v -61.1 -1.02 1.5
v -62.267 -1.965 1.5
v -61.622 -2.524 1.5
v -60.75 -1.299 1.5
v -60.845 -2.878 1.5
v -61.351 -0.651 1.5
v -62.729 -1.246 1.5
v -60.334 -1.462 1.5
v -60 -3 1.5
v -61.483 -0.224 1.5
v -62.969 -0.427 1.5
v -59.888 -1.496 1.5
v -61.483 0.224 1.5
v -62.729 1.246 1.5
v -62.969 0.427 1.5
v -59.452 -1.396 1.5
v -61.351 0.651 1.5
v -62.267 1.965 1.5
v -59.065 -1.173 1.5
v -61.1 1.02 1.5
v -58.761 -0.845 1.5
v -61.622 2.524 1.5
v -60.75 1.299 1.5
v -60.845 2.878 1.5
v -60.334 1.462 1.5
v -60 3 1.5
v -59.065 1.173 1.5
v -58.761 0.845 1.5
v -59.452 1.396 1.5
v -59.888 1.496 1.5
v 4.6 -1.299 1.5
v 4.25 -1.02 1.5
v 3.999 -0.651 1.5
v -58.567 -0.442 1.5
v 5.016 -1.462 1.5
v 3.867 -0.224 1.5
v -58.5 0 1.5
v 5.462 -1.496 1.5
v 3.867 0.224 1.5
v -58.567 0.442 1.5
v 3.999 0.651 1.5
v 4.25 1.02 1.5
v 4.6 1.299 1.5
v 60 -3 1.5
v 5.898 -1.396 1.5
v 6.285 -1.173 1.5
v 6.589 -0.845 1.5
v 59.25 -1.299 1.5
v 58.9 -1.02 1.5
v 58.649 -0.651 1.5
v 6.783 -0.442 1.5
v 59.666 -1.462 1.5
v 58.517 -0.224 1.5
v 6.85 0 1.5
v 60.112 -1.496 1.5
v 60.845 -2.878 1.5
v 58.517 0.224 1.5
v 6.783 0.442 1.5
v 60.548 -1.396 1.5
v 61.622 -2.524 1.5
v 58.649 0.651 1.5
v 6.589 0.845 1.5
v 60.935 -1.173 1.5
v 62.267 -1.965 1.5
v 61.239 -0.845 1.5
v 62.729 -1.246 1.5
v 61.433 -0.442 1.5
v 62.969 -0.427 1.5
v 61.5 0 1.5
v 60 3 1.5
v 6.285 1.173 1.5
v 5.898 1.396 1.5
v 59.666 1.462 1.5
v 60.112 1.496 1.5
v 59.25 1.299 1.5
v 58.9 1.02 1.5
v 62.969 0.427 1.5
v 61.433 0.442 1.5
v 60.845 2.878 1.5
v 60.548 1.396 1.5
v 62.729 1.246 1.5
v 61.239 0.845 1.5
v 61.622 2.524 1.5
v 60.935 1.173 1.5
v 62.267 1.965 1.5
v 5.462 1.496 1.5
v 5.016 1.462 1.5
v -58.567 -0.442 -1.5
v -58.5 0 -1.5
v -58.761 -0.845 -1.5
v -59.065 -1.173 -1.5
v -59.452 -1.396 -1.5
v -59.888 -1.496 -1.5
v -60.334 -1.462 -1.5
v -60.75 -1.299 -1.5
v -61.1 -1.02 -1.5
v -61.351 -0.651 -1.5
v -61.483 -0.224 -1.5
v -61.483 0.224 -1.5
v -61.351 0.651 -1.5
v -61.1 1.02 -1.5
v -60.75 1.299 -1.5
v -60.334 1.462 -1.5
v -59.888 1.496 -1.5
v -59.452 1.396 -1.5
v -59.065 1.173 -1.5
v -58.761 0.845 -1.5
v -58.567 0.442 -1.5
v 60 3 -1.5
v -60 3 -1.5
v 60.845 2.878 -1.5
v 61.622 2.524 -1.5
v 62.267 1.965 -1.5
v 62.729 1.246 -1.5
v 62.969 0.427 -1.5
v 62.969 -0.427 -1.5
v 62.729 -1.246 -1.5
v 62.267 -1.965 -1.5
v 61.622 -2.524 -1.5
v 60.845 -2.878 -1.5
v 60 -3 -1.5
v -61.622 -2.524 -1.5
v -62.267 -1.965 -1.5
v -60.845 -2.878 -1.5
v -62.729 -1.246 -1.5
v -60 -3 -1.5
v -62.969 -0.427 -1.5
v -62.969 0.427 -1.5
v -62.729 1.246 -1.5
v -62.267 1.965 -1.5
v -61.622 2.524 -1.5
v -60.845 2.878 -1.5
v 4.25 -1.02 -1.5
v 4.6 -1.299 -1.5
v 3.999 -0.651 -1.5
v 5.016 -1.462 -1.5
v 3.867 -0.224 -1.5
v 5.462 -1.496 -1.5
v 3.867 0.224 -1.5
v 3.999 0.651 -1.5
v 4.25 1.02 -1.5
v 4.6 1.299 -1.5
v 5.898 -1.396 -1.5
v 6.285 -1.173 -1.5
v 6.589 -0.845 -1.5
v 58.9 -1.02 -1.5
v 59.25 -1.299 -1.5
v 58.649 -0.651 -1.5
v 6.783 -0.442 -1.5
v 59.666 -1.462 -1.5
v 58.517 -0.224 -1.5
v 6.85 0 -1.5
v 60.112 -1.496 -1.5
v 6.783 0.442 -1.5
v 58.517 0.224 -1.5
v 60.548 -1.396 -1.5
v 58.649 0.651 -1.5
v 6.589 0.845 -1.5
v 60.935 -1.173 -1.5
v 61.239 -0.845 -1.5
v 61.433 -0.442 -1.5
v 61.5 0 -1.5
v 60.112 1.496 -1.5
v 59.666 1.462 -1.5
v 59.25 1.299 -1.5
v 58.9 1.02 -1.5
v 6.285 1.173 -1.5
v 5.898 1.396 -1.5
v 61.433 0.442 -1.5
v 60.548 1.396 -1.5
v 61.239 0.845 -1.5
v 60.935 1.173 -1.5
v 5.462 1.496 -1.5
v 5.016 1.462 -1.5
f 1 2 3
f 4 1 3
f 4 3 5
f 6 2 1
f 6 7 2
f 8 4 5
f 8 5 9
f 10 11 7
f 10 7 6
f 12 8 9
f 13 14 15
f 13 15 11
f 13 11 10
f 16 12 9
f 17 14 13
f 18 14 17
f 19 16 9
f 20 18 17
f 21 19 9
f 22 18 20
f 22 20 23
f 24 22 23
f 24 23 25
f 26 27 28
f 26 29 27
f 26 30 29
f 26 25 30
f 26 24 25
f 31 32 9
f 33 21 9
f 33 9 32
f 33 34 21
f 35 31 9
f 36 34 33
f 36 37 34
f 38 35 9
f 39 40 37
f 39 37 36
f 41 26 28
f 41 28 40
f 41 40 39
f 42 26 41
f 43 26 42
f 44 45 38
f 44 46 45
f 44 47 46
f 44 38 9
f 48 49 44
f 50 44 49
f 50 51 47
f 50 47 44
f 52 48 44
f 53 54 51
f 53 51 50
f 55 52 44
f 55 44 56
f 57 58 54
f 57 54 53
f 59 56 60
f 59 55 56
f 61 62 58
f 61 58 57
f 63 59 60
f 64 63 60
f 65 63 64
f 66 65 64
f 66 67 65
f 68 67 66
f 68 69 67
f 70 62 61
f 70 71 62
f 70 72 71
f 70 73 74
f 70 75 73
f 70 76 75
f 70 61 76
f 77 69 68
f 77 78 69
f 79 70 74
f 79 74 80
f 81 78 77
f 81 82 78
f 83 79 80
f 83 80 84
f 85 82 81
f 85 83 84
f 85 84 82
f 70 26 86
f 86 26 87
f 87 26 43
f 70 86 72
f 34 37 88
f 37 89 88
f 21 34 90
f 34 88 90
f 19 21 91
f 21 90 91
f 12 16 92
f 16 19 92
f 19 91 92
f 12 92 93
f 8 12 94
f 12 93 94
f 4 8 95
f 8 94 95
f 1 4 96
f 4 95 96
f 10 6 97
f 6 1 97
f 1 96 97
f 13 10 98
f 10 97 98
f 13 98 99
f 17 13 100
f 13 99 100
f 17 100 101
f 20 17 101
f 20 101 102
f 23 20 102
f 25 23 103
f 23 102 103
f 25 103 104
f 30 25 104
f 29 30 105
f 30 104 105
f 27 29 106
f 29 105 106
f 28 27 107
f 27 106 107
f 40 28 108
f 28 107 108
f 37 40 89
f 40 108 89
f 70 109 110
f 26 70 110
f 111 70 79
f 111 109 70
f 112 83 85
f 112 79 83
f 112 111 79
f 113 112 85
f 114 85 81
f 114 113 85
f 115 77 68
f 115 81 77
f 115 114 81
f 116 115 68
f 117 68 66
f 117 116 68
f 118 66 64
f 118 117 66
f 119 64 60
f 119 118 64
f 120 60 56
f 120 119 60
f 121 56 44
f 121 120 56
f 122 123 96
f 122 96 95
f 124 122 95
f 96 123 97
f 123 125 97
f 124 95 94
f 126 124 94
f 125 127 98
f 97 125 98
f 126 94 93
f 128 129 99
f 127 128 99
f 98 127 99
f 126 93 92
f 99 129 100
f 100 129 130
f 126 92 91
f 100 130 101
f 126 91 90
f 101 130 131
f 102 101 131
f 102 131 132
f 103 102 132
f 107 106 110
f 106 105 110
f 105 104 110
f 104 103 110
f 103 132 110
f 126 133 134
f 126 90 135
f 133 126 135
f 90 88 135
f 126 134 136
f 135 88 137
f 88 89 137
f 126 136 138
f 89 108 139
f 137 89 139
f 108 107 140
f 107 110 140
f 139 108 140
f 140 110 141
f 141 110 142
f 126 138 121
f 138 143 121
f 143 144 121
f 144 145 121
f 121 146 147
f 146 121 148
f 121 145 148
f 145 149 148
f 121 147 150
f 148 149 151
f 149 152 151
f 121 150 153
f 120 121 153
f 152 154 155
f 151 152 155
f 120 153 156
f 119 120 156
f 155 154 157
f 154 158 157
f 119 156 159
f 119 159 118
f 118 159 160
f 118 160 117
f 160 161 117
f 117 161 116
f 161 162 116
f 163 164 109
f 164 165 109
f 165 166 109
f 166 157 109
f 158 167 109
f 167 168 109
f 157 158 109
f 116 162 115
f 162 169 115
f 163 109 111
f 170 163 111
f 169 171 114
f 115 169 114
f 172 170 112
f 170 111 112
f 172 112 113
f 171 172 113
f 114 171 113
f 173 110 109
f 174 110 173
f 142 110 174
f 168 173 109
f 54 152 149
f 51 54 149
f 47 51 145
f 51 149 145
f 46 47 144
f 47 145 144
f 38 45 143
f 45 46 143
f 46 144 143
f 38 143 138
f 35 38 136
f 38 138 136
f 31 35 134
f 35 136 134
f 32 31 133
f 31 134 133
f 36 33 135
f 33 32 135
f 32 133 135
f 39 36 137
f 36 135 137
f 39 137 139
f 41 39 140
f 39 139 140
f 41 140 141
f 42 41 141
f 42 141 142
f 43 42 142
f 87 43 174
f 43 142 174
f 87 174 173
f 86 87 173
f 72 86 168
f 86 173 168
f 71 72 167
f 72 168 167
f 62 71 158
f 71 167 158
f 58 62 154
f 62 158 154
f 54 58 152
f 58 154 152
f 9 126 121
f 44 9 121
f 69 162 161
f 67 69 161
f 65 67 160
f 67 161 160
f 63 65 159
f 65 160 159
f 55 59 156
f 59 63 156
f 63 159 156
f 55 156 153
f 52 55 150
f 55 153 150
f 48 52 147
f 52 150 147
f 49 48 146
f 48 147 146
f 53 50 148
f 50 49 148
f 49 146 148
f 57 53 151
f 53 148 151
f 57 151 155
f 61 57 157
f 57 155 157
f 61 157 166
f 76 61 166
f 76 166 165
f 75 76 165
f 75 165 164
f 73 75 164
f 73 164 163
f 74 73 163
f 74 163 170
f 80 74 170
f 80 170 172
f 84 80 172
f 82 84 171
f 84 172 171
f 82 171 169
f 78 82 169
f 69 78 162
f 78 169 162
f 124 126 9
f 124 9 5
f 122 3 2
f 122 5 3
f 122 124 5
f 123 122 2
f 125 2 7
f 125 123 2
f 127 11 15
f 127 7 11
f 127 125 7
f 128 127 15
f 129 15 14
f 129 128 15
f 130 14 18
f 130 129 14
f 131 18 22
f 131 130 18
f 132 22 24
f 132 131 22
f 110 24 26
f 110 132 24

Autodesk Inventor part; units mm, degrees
ref_plane "YZ Plane" through (0, 0, 0) normal (1, 0, 0) x (0, 1, 0)
ref_plane "XZ Plane" through (0, 0, 0) normal (0, 1, 0) x (-1, 0, 0)
ref_plane "XY Plane" through (0, 0, 0) normal (0, 0, 1) x (1, 0, 0)
sketch "Esquisse1" plane through (0, 0, 0) normal (0, 0, 1) x (1, 0, 0)
  line L0 (-63, 0) -> (63, 0) construction
  line L1 (-60, -3) -> (60, -3)
  line L2 (60, 3) -> (-60, 3)
  arc A0 (-60, 3) -> (-60, -3) centre (-60, 0) ccw
  arc A1 (60, -3) -> (60, 3) centre (60, 0) ccw
  line L3 (0, -4.2) -> (0, 4.2) projected
  circle A2 centre (-60, 0) radius 1.5
  circle A3 centre (60, 0) radius 1.5
  circle A4 centre (5.35, 0) radius 1.5
  point P0 (0, 0)
  point P1 (0, 0)
  dimension "d0" = 120
  dimension "d1" = 6
  dimension "d2" = 3
  dimension "d4" = 3
  dimension "d7" = 3
  dimension "d9" = 54.65
extrude "Extrusion1" add sketch "Esquisse1" along normal mid plane 3
properties part number "barre_direction"
